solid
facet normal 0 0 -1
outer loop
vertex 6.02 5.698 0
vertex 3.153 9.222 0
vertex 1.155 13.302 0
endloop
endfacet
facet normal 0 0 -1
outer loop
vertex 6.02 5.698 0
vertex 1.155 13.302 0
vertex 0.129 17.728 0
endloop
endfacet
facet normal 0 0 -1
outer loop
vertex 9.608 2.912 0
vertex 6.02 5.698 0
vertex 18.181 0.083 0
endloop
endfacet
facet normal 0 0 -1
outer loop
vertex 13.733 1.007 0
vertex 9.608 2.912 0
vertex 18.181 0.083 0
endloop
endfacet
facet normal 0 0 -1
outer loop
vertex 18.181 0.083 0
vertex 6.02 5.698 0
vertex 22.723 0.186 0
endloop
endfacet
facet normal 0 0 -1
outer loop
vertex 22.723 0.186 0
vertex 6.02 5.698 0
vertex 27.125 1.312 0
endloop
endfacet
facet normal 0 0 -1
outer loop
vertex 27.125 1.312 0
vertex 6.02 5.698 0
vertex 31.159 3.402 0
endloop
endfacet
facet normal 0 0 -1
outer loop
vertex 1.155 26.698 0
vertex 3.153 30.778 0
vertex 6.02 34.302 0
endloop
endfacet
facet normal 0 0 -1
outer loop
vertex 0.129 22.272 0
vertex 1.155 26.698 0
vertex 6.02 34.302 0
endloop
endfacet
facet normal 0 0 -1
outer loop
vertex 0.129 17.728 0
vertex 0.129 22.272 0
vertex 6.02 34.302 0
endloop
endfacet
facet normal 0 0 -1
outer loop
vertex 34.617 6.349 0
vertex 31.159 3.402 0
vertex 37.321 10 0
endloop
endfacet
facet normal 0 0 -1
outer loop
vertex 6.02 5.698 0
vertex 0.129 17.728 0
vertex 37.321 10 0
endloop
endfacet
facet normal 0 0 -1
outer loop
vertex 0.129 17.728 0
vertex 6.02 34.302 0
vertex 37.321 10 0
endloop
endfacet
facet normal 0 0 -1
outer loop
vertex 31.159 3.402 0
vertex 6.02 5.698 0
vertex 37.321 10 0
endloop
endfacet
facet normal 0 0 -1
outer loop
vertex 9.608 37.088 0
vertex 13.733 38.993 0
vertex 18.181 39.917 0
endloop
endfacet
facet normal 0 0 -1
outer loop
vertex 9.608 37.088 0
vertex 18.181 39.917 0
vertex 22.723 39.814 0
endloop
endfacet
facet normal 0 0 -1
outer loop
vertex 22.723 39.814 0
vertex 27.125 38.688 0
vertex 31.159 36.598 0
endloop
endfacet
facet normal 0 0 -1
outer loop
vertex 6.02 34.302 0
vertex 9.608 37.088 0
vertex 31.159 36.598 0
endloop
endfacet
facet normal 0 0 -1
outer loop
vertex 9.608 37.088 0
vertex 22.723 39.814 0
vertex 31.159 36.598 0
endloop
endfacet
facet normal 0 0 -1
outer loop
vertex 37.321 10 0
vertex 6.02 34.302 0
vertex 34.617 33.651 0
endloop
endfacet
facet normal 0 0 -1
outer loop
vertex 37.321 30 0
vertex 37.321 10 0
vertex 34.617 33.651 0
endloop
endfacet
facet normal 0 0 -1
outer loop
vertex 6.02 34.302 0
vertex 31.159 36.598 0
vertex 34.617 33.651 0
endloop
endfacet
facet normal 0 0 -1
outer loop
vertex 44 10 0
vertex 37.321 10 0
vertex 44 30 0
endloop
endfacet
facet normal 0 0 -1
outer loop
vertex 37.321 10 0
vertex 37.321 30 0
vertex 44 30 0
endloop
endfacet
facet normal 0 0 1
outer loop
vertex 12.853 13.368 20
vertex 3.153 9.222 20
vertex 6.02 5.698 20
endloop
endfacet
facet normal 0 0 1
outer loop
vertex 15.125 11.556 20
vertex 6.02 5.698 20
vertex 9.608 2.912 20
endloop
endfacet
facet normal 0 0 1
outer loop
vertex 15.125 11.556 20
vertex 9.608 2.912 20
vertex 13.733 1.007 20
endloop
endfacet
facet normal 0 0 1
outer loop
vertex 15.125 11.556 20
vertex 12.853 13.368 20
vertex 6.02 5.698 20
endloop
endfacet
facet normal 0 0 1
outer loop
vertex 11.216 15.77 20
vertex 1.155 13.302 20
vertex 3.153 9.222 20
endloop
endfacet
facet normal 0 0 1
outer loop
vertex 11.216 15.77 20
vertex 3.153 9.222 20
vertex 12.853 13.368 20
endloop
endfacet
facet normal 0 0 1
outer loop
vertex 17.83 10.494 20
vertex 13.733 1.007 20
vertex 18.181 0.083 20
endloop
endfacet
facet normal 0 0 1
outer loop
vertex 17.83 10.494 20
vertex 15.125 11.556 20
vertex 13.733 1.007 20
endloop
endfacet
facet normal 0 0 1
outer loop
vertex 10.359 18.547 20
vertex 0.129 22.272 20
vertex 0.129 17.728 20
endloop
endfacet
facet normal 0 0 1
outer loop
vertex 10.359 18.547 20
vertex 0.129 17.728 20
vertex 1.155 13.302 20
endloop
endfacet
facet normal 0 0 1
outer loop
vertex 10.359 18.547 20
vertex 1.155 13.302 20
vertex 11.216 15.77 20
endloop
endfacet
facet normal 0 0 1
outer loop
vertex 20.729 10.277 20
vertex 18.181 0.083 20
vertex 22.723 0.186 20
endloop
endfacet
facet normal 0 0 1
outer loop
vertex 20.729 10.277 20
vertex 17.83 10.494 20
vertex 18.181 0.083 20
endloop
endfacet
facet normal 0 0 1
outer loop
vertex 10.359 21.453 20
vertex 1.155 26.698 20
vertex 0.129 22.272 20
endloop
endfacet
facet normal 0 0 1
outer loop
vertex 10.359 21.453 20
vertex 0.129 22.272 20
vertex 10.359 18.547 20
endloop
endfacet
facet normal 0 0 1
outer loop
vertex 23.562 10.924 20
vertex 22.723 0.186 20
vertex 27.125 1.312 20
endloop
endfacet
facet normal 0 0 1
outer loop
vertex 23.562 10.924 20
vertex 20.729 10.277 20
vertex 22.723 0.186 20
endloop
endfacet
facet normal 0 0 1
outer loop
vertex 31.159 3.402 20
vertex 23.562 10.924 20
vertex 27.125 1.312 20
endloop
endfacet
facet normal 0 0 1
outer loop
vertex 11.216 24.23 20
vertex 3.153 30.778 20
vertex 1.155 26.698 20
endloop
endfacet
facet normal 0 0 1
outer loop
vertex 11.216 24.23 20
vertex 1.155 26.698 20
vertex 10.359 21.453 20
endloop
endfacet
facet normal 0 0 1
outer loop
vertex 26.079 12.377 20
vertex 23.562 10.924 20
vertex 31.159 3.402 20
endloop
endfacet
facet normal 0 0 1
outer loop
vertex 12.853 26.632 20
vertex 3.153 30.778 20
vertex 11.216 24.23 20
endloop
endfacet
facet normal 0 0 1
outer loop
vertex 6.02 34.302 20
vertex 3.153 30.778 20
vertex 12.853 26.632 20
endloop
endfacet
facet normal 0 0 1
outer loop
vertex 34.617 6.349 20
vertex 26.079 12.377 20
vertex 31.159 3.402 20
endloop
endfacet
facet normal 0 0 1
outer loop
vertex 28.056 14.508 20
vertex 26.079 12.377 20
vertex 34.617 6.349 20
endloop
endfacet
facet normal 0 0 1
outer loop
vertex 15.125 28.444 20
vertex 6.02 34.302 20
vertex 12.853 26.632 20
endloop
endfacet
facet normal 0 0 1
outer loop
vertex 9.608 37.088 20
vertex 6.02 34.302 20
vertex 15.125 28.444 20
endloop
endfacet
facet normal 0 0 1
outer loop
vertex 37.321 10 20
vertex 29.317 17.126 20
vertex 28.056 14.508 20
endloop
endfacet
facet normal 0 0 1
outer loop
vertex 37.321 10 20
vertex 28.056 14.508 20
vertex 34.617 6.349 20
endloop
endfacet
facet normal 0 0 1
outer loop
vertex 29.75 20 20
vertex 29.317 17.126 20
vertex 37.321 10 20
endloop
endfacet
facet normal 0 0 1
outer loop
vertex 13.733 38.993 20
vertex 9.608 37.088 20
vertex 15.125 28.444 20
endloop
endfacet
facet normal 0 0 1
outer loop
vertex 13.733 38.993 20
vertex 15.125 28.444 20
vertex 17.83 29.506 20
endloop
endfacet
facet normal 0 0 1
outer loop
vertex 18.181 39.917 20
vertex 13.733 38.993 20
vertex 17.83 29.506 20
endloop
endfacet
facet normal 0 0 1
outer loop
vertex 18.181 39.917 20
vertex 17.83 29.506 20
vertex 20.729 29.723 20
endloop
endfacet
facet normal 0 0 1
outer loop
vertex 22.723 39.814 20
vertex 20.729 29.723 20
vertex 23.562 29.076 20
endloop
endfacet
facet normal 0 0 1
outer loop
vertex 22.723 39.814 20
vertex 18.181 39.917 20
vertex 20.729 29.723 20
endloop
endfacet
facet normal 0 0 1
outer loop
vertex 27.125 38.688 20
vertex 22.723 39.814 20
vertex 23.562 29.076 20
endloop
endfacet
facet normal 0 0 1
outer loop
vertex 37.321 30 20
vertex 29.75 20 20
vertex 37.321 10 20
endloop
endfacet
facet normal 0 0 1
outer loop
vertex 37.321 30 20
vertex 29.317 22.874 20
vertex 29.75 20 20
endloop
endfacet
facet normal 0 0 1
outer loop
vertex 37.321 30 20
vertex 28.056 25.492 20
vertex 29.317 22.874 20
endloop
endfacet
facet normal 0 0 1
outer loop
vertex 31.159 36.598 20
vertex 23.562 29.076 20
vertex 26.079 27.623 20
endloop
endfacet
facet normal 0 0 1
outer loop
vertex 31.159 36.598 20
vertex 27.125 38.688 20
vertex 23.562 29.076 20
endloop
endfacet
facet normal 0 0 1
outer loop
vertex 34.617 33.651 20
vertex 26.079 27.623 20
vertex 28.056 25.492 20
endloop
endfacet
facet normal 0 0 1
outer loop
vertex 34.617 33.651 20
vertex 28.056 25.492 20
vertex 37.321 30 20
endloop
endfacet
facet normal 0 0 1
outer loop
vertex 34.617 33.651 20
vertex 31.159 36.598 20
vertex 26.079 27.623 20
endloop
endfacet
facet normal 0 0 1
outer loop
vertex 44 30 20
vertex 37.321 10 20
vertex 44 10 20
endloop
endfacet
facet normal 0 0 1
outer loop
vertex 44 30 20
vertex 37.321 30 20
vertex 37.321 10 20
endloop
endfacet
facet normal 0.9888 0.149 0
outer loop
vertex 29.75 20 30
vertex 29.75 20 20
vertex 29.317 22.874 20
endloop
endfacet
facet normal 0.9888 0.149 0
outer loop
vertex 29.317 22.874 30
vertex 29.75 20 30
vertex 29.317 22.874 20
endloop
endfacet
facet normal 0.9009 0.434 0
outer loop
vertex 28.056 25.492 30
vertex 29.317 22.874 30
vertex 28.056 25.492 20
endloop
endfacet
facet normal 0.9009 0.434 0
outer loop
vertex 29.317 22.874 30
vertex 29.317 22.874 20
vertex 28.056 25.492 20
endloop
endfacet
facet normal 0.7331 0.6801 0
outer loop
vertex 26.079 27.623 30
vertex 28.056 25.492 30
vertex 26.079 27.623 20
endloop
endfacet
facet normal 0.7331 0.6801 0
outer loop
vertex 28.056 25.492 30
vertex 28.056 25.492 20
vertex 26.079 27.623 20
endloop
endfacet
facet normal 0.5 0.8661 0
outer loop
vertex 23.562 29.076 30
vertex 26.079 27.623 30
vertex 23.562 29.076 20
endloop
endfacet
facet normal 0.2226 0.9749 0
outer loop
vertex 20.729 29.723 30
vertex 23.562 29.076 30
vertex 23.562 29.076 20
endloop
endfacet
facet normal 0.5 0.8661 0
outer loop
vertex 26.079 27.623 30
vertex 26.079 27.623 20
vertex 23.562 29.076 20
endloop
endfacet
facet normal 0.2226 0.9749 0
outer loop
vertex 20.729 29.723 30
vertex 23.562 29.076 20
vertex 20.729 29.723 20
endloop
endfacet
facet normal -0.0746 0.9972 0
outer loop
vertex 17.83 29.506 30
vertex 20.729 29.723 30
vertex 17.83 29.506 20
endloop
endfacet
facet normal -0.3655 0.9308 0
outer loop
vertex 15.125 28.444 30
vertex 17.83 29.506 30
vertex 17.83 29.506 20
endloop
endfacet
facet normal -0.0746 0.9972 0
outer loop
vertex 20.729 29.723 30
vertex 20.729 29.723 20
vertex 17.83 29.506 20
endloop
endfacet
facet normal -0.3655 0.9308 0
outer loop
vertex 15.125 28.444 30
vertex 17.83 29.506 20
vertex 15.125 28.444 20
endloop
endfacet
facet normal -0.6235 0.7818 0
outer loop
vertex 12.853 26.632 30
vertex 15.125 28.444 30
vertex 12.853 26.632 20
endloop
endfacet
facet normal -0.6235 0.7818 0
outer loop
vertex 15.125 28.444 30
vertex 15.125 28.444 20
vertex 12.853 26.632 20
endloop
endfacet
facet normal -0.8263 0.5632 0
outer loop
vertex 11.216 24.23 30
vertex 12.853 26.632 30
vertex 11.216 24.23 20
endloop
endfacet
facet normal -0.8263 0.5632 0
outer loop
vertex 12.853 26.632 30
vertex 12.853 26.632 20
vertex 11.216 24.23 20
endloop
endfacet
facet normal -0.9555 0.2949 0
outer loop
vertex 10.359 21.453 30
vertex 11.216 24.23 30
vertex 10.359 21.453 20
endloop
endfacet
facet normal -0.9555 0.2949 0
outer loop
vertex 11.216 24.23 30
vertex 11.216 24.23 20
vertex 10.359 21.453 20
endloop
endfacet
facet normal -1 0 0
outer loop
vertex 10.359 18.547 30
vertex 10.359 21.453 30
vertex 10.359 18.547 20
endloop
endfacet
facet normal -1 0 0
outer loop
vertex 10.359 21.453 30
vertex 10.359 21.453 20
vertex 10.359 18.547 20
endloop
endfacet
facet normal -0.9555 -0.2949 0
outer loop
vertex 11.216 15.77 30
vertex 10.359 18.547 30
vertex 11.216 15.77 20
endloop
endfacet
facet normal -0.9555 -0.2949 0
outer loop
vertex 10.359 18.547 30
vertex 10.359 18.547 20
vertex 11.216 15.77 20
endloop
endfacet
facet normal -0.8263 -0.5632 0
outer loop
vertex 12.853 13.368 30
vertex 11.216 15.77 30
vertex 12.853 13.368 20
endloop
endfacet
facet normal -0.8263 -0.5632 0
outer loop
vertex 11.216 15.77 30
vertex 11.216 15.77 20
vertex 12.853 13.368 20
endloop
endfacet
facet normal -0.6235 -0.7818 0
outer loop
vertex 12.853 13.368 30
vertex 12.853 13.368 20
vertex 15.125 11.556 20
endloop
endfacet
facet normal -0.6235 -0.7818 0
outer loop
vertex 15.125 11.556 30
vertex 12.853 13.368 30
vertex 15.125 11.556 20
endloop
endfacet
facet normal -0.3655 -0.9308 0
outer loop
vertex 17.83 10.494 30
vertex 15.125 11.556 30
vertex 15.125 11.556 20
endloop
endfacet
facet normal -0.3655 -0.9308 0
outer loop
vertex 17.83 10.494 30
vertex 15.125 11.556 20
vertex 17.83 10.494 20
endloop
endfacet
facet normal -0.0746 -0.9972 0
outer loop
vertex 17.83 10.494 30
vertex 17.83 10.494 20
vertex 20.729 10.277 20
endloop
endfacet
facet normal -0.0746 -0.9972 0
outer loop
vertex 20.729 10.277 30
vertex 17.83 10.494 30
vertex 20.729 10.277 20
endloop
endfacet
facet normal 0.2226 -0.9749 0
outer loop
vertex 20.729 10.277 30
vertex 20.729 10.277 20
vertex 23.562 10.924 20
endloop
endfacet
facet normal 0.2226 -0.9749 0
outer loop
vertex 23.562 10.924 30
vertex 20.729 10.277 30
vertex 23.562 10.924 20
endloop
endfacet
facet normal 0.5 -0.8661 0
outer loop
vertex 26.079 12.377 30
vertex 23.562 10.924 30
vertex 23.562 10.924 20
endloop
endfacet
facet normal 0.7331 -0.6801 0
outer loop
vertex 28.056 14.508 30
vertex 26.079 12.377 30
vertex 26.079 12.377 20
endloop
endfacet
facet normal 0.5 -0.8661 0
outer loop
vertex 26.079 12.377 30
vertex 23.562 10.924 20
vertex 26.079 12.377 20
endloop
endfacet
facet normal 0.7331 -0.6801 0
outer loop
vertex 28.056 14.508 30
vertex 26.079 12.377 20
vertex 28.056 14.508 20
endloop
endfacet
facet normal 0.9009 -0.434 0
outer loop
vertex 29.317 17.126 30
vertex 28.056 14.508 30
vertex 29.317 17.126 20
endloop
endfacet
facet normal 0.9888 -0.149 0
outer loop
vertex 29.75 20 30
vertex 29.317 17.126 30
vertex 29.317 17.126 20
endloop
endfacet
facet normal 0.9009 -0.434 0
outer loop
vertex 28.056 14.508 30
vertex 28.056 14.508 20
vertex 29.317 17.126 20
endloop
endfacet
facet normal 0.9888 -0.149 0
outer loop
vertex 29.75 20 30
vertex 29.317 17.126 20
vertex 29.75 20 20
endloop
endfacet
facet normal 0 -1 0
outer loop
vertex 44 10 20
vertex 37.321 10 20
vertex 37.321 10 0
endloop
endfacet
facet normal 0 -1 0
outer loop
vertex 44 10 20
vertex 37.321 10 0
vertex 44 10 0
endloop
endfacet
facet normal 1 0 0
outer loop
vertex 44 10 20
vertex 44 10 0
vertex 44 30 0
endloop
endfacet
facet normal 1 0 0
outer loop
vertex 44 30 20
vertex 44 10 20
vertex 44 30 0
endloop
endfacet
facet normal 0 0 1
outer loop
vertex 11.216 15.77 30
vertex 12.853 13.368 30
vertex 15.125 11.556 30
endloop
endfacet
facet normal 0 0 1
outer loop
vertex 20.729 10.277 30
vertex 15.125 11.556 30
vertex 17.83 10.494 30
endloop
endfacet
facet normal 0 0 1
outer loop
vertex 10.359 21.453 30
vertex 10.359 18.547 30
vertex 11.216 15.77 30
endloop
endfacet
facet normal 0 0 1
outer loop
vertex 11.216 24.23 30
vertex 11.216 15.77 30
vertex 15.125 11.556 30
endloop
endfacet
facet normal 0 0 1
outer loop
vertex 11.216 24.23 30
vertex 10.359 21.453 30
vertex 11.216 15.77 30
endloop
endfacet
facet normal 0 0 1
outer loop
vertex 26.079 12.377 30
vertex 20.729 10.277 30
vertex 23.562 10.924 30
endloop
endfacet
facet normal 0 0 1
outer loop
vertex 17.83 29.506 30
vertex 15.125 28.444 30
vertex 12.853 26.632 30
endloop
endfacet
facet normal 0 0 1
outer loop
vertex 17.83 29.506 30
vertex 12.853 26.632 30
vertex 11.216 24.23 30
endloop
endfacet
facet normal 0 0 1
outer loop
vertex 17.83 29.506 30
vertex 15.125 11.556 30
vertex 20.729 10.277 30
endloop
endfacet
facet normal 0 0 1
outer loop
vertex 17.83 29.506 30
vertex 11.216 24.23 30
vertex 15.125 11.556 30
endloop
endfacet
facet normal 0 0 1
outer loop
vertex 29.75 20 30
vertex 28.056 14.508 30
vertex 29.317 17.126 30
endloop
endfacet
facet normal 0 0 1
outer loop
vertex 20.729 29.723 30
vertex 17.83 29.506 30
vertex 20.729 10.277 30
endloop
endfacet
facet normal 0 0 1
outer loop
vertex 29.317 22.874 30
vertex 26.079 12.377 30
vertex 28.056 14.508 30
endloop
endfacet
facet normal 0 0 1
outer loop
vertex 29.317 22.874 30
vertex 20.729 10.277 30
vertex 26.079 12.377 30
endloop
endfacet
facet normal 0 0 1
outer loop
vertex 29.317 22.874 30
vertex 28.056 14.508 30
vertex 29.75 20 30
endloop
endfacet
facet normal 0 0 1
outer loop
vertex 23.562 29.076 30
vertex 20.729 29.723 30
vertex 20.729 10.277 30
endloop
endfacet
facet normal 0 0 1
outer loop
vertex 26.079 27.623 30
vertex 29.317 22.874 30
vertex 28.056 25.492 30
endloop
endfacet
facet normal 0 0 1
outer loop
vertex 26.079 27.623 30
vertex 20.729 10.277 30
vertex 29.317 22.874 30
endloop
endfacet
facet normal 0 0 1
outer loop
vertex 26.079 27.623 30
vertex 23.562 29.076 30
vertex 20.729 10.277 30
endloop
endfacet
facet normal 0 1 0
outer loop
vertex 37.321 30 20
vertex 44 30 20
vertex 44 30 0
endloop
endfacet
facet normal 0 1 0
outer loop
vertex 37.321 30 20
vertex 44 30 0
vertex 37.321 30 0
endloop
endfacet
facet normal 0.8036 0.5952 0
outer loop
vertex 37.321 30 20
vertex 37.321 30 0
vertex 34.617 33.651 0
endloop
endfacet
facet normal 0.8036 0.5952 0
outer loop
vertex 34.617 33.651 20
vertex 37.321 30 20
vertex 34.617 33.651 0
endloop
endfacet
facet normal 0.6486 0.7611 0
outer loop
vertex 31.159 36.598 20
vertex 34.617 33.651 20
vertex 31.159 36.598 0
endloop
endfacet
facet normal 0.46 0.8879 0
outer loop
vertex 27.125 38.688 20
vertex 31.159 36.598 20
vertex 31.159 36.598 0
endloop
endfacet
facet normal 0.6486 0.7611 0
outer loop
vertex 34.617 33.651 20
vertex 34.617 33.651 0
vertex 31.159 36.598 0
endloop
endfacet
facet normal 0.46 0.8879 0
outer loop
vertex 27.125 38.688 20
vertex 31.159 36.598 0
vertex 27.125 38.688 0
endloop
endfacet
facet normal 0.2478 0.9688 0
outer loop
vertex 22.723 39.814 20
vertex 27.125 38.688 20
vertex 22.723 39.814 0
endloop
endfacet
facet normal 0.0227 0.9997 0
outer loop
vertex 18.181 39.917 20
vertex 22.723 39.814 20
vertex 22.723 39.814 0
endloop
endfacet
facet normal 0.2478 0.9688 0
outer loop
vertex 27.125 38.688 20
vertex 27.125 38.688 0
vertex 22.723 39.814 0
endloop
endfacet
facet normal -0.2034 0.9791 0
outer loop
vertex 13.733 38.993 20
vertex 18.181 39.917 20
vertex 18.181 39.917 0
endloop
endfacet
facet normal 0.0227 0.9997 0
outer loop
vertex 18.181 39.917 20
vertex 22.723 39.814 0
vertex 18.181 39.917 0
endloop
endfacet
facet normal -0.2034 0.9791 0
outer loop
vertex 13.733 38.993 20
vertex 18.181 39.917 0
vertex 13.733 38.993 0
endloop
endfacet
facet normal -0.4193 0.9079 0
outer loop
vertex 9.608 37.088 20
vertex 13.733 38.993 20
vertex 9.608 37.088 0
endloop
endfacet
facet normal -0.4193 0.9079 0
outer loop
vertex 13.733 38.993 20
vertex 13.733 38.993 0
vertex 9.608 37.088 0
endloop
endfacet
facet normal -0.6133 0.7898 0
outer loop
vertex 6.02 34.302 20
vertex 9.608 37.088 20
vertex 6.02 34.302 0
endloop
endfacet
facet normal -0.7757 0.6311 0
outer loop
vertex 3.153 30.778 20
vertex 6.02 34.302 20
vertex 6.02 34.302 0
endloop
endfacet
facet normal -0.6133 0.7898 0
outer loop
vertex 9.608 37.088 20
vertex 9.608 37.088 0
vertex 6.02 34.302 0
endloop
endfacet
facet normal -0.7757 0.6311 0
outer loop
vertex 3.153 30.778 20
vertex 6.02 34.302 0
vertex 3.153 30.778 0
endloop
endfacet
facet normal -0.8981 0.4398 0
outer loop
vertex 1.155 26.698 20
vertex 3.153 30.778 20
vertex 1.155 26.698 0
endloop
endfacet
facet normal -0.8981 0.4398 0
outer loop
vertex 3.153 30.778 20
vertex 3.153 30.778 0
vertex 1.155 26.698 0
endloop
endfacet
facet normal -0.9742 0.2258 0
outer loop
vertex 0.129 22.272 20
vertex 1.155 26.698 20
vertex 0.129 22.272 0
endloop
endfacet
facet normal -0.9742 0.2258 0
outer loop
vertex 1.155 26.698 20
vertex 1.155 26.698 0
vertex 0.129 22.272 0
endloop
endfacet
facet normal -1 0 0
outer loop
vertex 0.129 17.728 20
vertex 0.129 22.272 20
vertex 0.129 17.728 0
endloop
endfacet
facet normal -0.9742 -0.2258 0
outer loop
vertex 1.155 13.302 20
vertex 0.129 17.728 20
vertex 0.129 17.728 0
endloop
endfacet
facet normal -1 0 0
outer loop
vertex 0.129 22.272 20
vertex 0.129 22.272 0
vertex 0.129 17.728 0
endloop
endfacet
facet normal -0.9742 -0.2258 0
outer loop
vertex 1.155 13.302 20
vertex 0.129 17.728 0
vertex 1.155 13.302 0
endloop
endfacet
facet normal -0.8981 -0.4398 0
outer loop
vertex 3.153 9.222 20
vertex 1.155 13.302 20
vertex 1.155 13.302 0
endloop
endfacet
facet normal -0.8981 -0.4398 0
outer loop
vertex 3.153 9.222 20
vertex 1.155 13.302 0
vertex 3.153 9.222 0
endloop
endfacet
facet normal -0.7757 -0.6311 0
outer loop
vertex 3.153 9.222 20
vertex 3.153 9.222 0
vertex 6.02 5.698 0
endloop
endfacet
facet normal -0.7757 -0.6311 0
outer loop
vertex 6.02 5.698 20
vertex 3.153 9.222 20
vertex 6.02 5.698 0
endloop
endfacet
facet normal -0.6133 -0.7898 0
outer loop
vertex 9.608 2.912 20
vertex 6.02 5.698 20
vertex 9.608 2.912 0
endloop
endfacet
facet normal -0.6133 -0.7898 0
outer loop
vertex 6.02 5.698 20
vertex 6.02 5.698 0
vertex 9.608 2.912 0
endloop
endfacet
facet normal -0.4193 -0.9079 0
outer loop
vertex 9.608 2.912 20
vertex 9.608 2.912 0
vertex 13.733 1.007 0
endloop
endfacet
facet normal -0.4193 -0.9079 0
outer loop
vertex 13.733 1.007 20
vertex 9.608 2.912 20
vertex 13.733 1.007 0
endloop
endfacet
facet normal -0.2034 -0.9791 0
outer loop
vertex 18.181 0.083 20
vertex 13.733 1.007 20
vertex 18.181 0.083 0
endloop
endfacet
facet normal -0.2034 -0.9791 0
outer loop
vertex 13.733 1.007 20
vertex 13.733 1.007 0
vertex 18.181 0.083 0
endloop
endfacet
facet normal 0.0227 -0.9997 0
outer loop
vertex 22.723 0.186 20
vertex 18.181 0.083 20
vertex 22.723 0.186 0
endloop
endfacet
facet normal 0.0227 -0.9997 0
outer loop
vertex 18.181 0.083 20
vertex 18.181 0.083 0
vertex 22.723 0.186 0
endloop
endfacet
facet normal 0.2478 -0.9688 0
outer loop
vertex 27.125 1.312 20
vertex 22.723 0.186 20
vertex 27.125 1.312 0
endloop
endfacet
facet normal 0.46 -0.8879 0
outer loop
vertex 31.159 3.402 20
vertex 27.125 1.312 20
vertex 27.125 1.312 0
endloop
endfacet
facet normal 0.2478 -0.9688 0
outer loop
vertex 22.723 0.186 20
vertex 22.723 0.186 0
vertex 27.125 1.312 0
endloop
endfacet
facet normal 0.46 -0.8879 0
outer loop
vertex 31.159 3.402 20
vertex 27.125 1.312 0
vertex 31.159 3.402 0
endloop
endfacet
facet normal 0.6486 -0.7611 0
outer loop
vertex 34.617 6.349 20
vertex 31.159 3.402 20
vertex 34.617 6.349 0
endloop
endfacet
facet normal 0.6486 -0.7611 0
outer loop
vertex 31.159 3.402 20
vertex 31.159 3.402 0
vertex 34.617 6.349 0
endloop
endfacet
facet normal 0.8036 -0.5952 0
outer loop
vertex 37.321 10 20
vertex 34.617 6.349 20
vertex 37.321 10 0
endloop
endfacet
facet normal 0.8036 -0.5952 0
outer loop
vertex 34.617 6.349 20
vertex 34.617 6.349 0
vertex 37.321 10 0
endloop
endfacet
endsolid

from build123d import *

# Parameters (mm, degrees)
F1_DEPTH = 20
F2_R     = 9.75
F3_DEPTH = 10


with BuildPart() as f1:
    # F0 (on Top) → F1 (new body)
    with BuildSketch(Plane.XY):
        with BuildLine():
            ThreePointArc((37.3205080757, 10), (39.3185165258, 14.8236190979), (40, 20))
            ThreePointArc((40, 20), (39.3185165258, 25.1763809021), (37.3205080757, 30))
            Line((37.3205080757, 30), (20, 30))
            Line((20, 30), (20, 10))
            Line((20, 10), (37.3205080757, 10))
        make_face()
        with BuildLine():
            ThreePointArc((37.3205080757, 30), (39.3185165258, 25.1763809021), (40, 20))
            ThreePointArc((40, 20), (39.3185165258, 14.8236190979), (37.3205080757, 10))
            Line((37.3205080757, 10), (44, 10))
            Line((44, 10), (44, 30))
            Line((44, 30), (37.3205080757, 30))
        make_face()
        with BuildLine():
            Line((20, 30), (37.3205080757, 30))
            ThreePointArc((37.3205080757, 30), (0, 20), (37.3205080757, 10))
            Line((37.3205080757, 10), (20, 10))
            Line((20, 10), (20, 30))
        make_face()
    extrude(amount=F1_DEPTH)

    # F2 (on face) → F3 (join)
    with BuildSketch(Plane.XY.offset(20)):
        with Locations((20, 20)):
            Circle(F2_R)
    extrude(amount=F3_DEPTH)


solid = f1.part
